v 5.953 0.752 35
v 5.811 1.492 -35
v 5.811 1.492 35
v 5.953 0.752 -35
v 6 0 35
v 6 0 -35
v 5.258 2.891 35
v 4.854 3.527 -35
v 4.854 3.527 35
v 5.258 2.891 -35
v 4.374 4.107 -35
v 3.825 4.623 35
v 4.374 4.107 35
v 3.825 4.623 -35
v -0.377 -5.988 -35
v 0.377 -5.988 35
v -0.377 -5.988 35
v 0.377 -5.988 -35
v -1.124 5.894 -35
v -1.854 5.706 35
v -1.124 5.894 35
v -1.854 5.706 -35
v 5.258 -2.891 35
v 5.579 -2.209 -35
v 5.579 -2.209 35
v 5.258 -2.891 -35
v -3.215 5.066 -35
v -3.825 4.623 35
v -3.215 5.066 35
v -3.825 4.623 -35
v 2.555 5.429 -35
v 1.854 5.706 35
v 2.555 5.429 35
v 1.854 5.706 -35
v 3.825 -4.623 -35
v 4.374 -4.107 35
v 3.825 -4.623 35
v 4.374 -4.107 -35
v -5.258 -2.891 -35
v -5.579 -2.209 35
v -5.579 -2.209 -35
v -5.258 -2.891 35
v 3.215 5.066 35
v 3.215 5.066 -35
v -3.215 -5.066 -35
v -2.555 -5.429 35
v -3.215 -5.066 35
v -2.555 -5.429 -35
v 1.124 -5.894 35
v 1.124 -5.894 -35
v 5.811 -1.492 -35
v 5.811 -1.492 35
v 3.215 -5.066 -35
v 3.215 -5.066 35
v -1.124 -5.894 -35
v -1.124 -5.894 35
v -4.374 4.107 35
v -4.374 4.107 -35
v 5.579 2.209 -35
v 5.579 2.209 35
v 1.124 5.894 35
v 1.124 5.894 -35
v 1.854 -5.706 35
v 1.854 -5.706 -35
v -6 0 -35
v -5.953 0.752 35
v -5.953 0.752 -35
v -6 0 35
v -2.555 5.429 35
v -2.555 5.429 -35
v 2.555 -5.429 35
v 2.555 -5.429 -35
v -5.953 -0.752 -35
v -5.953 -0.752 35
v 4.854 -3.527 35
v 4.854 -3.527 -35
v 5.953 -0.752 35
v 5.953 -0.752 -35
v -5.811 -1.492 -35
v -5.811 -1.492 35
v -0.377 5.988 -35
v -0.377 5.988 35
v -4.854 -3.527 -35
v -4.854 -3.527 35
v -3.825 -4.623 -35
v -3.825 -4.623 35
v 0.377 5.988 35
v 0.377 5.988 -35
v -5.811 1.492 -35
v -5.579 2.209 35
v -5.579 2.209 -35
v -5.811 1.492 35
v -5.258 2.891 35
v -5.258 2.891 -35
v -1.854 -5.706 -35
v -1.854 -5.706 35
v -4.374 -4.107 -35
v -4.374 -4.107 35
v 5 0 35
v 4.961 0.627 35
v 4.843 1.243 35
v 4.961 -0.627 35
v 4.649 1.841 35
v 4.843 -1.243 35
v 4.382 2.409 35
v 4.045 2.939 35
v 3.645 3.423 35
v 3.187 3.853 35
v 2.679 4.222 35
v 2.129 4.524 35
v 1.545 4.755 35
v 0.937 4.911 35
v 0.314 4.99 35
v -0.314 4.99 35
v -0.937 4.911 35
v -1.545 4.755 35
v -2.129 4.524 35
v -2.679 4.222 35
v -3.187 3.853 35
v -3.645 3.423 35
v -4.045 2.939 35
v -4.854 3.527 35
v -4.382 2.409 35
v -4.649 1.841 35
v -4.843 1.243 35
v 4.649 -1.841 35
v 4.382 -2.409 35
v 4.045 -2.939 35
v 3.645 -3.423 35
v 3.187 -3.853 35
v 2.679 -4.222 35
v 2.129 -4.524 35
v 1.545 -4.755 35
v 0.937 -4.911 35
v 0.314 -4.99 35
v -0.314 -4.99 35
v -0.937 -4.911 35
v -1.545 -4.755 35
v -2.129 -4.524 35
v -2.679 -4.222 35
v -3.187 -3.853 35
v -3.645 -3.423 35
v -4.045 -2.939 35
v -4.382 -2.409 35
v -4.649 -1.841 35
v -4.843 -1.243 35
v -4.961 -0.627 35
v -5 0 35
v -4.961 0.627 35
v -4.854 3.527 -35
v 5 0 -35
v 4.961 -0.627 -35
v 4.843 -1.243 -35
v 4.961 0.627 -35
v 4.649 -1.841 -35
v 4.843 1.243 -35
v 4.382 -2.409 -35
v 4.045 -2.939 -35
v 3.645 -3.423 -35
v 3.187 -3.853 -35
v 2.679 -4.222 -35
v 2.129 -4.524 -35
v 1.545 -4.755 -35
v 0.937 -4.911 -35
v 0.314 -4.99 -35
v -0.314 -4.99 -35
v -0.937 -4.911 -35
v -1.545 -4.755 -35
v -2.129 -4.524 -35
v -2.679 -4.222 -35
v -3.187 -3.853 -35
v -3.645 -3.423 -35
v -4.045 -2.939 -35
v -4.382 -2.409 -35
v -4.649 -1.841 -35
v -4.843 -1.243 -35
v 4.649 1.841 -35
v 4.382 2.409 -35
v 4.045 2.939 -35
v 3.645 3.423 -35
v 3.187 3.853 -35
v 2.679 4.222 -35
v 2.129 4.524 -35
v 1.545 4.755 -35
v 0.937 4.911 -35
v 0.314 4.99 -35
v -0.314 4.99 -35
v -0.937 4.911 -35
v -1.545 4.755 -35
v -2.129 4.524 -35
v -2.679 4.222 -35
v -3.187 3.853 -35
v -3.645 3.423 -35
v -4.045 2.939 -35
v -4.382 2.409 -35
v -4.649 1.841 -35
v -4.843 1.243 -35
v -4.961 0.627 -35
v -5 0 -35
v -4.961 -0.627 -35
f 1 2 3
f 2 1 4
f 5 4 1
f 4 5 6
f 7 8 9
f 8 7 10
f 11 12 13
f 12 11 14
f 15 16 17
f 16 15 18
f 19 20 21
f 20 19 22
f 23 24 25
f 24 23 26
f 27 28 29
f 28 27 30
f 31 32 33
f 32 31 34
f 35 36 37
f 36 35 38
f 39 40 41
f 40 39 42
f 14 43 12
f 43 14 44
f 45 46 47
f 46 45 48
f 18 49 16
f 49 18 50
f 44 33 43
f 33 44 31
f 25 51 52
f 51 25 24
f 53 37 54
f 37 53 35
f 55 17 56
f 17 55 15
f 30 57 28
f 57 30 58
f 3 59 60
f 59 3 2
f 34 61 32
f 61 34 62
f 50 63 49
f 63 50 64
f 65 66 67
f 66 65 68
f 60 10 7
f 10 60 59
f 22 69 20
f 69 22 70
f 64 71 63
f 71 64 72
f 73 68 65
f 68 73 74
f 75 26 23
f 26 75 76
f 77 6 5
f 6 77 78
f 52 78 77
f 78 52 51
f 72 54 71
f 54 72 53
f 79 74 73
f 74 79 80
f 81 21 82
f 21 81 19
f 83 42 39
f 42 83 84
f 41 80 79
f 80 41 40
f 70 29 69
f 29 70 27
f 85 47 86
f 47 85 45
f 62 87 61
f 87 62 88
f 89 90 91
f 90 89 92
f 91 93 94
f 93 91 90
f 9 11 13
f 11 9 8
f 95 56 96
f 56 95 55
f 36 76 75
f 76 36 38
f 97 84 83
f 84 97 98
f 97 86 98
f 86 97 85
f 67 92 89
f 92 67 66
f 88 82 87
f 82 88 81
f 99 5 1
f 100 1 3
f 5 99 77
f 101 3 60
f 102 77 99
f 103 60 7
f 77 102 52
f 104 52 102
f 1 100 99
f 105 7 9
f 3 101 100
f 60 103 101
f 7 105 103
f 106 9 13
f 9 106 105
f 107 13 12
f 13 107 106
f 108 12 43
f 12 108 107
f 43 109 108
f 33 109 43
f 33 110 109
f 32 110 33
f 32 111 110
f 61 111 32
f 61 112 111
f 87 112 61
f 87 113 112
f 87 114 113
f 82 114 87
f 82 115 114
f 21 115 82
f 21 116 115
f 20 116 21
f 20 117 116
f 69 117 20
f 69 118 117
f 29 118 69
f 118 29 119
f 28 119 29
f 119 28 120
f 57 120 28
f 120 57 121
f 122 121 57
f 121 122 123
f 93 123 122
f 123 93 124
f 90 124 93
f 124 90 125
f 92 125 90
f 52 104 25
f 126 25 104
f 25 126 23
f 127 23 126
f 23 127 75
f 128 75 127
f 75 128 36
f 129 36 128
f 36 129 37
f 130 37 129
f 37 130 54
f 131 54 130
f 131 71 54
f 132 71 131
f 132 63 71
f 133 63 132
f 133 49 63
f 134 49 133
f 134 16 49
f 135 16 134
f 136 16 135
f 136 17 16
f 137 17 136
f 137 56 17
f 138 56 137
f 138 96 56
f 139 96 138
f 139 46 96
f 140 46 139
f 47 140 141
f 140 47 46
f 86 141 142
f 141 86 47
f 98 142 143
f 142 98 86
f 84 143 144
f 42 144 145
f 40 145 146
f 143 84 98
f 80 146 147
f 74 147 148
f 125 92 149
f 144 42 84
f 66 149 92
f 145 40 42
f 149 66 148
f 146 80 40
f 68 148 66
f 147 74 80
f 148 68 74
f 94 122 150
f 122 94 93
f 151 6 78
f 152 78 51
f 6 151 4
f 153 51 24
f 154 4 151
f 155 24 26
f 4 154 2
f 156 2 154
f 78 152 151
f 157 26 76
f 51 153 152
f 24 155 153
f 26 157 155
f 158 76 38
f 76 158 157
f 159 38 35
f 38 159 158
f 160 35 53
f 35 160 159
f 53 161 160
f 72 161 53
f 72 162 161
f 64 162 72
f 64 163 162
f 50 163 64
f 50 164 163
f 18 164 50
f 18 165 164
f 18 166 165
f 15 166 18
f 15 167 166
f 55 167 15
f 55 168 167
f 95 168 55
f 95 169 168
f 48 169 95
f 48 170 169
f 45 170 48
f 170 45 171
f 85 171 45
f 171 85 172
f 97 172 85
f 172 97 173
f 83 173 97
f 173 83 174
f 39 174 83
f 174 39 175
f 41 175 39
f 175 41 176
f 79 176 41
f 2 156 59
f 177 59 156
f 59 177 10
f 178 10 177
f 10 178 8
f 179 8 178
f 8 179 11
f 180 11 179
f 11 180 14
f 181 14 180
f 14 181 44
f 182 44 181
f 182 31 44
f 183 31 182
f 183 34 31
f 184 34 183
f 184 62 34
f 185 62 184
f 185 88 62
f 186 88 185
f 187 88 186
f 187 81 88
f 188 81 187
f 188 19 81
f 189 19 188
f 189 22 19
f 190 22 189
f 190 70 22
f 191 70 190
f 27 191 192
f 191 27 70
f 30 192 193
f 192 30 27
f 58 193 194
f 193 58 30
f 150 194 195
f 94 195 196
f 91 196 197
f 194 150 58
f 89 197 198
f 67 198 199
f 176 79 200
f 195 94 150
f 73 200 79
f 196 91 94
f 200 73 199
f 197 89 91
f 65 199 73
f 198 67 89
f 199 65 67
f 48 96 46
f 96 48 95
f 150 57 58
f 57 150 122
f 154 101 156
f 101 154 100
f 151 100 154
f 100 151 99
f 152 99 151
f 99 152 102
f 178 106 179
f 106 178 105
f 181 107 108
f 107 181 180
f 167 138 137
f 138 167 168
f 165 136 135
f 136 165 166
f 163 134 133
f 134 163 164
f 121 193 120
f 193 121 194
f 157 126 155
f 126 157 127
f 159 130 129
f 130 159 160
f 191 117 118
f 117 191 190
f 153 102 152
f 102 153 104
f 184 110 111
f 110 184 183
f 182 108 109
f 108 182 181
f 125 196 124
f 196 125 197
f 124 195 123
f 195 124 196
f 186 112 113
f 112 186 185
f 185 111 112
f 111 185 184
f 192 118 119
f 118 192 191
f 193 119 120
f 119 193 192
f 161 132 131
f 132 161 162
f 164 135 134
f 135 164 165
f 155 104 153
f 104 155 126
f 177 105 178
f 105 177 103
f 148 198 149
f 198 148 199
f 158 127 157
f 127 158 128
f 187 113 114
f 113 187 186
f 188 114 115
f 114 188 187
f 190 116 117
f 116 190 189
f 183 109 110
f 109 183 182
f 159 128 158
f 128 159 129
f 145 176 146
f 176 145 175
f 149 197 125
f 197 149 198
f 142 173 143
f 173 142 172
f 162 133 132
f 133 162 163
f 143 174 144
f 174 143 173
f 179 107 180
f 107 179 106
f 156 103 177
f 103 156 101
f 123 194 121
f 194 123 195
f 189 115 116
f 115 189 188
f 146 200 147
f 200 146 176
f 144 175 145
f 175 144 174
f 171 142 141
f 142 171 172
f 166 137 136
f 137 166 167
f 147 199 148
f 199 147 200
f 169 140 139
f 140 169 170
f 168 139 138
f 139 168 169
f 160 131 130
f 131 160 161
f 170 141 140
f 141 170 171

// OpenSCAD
$fn = 50;


difference() {
	union() {
		translate(v = [0, 0, -35.0000000000]) {
			cylinder(h = 70, r = 6.0000000000);
		}
	}
	union() {
		translate(v = [0, 0, -100.0000000000]) {
			cylinder(h = 200, r = 5.0000000000);
		}
	}
}
